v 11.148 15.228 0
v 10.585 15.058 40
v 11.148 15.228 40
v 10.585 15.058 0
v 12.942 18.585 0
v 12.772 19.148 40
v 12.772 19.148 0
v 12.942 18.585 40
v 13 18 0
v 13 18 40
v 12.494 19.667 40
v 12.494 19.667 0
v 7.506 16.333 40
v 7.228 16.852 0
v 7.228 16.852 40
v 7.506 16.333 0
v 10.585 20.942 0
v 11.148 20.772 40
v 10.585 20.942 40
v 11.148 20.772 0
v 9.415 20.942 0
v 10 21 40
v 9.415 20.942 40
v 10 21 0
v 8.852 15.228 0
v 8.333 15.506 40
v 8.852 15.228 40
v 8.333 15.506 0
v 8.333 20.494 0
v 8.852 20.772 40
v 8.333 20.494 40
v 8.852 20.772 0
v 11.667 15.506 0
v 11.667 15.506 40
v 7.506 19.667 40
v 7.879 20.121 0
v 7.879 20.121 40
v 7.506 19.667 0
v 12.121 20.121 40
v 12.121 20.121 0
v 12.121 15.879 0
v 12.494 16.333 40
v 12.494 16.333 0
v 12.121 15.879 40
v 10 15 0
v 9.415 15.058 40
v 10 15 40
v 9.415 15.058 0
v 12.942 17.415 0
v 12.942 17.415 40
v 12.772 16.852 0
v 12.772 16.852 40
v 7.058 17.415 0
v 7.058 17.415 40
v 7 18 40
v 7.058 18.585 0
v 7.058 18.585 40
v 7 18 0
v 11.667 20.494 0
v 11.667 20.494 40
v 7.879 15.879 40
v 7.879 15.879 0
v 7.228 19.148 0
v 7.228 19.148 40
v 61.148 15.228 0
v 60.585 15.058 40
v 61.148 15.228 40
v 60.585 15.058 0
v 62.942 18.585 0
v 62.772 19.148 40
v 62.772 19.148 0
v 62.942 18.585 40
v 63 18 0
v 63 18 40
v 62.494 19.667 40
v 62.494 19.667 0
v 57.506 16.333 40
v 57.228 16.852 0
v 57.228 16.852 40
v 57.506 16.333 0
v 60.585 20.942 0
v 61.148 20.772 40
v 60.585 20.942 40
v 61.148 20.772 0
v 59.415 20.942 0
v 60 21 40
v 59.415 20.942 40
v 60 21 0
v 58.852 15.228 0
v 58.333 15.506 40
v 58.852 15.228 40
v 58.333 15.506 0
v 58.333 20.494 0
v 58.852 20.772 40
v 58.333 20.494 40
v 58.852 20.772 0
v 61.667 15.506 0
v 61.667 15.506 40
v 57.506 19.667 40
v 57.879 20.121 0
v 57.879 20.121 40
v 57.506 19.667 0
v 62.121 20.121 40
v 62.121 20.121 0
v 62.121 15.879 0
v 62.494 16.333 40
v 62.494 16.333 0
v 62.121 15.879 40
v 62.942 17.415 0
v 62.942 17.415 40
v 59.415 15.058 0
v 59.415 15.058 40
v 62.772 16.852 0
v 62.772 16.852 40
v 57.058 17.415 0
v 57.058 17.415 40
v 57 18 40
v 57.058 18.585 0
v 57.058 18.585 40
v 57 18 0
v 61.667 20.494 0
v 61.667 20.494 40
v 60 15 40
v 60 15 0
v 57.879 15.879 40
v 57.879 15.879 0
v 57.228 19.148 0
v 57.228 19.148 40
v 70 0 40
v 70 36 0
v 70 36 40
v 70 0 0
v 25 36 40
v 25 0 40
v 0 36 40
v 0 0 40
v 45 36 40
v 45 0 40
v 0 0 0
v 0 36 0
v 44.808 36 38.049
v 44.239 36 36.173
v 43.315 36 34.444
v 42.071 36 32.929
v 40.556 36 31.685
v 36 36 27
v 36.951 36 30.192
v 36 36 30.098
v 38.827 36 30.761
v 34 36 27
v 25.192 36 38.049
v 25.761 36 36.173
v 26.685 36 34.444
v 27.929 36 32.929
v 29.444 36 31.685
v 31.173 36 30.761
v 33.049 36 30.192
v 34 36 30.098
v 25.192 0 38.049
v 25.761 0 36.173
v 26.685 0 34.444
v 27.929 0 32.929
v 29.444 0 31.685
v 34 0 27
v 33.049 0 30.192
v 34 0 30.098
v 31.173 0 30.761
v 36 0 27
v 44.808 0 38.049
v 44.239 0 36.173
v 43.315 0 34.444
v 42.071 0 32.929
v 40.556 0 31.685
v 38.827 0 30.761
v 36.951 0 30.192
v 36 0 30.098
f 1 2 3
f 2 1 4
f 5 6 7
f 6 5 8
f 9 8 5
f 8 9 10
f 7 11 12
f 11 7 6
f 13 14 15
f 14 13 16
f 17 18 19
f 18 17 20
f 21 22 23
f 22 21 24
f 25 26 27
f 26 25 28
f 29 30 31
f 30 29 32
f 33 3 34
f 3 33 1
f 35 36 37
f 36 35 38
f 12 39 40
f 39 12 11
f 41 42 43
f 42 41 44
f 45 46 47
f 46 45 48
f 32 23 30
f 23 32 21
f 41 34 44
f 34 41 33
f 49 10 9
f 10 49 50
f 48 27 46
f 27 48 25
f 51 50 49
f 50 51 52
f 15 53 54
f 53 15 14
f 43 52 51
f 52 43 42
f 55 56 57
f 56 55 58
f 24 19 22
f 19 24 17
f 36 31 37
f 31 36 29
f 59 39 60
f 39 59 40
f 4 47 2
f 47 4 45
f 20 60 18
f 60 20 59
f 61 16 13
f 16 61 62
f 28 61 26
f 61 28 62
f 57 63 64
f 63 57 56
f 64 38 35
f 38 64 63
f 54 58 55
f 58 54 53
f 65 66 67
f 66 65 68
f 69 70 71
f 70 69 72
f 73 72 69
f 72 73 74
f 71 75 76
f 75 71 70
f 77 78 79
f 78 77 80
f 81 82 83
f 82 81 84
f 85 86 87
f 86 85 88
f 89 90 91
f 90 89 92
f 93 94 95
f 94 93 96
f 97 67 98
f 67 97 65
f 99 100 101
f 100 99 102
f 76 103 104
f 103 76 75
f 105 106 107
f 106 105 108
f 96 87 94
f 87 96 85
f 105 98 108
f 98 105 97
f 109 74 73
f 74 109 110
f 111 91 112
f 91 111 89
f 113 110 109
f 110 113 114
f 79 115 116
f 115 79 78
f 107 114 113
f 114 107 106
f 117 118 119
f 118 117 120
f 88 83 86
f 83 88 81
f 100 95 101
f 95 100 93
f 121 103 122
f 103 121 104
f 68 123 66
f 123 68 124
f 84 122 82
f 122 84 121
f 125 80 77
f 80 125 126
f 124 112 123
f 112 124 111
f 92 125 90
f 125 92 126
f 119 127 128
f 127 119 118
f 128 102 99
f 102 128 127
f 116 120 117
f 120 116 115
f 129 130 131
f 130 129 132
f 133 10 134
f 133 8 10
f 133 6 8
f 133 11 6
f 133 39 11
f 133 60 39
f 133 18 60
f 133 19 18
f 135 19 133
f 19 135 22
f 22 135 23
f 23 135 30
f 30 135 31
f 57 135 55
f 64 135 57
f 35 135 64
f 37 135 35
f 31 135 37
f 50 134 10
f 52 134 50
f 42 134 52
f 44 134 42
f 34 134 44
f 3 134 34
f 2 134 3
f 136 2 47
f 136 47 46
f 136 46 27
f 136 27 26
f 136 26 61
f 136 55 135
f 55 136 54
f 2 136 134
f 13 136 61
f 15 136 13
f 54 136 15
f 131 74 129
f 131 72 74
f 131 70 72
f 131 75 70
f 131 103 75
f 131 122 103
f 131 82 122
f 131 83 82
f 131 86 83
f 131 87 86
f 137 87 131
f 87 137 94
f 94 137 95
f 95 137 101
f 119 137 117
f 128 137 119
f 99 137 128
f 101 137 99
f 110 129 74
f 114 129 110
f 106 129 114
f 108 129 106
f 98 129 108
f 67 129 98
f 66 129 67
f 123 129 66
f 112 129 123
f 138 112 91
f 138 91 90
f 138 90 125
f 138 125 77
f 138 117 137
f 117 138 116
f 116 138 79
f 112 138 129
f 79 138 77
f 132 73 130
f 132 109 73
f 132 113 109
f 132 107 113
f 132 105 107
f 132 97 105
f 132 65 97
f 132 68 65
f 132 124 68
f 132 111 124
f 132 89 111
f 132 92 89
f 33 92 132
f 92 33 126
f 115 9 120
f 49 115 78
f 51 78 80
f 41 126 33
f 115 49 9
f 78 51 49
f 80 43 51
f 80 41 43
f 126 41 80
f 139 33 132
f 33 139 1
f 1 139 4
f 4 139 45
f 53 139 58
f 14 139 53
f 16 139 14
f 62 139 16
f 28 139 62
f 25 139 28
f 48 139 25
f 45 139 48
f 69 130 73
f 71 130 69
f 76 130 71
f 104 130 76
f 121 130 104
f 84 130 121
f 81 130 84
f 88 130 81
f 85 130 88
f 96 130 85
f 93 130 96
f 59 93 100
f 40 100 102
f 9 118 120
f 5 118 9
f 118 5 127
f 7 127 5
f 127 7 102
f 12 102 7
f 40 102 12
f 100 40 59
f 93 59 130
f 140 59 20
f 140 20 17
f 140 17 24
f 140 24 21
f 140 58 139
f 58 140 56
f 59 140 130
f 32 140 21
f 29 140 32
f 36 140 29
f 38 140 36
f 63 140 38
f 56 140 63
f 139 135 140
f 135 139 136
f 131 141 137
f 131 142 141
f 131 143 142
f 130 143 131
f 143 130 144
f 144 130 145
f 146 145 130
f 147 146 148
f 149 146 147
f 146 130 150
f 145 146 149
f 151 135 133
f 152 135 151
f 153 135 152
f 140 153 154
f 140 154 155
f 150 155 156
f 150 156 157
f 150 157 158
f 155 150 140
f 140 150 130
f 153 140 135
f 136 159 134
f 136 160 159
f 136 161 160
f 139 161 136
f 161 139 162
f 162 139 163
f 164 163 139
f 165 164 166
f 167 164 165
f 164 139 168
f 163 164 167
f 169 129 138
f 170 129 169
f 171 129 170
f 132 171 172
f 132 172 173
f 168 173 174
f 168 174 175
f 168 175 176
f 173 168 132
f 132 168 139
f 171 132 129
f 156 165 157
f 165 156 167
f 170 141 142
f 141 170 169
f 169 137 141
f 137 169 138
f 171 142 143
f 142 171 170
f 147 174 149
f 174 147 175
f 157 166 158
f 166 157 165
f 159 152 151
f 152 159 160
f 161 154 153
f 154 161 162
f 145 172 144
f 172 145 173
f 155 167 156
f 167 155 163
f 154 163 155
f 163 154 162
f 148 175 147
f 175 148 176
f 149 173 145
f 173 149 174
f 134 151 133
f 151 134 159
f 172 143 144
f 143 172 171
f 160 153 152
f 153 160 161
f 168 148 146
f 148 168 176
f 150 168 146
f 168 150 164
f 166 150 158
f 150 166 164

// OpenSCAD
$fn = 32;

// ----------------------------------------------------------------------
// Saddle clamp: split shaft clamp
// ----------------------------------------------------------------------

// --- parameters (mm) ---
blk_l = 70;               // block length, X
blk_w = 36;               // block width, Y
blk_h = 40;               // block height
clamp_r = 10;             // shaft groove radius
hole_r = 3;               // bolt hole radius
hole_m = 10;              // bolt hole margin from the ends
saw_w = 2;                // saw kerf width

saw_depth = clamp_r + 3;  // saw kerf depth

difference() {
  cube([blk_l, blk_w, blk_h]);
  translate([blk_l / 2, -1, blk_h])
    rotate([-90, 0, 0])
      cylinder(h = blk_w + 2, r = clamp_r);
  for (sx = [0, 1])
    translate([sx ? blk_l - hole_m : hole_m, blk_w / 2, -1])
      cylinder(r = hole_r, h = blk_h + 2);
  translate([blk_l / 2 - saw_w / 2, -1, blk_h - saw_depth])
    cube([saw_w, blk_w + 2, saw_depth + 1]);
}
